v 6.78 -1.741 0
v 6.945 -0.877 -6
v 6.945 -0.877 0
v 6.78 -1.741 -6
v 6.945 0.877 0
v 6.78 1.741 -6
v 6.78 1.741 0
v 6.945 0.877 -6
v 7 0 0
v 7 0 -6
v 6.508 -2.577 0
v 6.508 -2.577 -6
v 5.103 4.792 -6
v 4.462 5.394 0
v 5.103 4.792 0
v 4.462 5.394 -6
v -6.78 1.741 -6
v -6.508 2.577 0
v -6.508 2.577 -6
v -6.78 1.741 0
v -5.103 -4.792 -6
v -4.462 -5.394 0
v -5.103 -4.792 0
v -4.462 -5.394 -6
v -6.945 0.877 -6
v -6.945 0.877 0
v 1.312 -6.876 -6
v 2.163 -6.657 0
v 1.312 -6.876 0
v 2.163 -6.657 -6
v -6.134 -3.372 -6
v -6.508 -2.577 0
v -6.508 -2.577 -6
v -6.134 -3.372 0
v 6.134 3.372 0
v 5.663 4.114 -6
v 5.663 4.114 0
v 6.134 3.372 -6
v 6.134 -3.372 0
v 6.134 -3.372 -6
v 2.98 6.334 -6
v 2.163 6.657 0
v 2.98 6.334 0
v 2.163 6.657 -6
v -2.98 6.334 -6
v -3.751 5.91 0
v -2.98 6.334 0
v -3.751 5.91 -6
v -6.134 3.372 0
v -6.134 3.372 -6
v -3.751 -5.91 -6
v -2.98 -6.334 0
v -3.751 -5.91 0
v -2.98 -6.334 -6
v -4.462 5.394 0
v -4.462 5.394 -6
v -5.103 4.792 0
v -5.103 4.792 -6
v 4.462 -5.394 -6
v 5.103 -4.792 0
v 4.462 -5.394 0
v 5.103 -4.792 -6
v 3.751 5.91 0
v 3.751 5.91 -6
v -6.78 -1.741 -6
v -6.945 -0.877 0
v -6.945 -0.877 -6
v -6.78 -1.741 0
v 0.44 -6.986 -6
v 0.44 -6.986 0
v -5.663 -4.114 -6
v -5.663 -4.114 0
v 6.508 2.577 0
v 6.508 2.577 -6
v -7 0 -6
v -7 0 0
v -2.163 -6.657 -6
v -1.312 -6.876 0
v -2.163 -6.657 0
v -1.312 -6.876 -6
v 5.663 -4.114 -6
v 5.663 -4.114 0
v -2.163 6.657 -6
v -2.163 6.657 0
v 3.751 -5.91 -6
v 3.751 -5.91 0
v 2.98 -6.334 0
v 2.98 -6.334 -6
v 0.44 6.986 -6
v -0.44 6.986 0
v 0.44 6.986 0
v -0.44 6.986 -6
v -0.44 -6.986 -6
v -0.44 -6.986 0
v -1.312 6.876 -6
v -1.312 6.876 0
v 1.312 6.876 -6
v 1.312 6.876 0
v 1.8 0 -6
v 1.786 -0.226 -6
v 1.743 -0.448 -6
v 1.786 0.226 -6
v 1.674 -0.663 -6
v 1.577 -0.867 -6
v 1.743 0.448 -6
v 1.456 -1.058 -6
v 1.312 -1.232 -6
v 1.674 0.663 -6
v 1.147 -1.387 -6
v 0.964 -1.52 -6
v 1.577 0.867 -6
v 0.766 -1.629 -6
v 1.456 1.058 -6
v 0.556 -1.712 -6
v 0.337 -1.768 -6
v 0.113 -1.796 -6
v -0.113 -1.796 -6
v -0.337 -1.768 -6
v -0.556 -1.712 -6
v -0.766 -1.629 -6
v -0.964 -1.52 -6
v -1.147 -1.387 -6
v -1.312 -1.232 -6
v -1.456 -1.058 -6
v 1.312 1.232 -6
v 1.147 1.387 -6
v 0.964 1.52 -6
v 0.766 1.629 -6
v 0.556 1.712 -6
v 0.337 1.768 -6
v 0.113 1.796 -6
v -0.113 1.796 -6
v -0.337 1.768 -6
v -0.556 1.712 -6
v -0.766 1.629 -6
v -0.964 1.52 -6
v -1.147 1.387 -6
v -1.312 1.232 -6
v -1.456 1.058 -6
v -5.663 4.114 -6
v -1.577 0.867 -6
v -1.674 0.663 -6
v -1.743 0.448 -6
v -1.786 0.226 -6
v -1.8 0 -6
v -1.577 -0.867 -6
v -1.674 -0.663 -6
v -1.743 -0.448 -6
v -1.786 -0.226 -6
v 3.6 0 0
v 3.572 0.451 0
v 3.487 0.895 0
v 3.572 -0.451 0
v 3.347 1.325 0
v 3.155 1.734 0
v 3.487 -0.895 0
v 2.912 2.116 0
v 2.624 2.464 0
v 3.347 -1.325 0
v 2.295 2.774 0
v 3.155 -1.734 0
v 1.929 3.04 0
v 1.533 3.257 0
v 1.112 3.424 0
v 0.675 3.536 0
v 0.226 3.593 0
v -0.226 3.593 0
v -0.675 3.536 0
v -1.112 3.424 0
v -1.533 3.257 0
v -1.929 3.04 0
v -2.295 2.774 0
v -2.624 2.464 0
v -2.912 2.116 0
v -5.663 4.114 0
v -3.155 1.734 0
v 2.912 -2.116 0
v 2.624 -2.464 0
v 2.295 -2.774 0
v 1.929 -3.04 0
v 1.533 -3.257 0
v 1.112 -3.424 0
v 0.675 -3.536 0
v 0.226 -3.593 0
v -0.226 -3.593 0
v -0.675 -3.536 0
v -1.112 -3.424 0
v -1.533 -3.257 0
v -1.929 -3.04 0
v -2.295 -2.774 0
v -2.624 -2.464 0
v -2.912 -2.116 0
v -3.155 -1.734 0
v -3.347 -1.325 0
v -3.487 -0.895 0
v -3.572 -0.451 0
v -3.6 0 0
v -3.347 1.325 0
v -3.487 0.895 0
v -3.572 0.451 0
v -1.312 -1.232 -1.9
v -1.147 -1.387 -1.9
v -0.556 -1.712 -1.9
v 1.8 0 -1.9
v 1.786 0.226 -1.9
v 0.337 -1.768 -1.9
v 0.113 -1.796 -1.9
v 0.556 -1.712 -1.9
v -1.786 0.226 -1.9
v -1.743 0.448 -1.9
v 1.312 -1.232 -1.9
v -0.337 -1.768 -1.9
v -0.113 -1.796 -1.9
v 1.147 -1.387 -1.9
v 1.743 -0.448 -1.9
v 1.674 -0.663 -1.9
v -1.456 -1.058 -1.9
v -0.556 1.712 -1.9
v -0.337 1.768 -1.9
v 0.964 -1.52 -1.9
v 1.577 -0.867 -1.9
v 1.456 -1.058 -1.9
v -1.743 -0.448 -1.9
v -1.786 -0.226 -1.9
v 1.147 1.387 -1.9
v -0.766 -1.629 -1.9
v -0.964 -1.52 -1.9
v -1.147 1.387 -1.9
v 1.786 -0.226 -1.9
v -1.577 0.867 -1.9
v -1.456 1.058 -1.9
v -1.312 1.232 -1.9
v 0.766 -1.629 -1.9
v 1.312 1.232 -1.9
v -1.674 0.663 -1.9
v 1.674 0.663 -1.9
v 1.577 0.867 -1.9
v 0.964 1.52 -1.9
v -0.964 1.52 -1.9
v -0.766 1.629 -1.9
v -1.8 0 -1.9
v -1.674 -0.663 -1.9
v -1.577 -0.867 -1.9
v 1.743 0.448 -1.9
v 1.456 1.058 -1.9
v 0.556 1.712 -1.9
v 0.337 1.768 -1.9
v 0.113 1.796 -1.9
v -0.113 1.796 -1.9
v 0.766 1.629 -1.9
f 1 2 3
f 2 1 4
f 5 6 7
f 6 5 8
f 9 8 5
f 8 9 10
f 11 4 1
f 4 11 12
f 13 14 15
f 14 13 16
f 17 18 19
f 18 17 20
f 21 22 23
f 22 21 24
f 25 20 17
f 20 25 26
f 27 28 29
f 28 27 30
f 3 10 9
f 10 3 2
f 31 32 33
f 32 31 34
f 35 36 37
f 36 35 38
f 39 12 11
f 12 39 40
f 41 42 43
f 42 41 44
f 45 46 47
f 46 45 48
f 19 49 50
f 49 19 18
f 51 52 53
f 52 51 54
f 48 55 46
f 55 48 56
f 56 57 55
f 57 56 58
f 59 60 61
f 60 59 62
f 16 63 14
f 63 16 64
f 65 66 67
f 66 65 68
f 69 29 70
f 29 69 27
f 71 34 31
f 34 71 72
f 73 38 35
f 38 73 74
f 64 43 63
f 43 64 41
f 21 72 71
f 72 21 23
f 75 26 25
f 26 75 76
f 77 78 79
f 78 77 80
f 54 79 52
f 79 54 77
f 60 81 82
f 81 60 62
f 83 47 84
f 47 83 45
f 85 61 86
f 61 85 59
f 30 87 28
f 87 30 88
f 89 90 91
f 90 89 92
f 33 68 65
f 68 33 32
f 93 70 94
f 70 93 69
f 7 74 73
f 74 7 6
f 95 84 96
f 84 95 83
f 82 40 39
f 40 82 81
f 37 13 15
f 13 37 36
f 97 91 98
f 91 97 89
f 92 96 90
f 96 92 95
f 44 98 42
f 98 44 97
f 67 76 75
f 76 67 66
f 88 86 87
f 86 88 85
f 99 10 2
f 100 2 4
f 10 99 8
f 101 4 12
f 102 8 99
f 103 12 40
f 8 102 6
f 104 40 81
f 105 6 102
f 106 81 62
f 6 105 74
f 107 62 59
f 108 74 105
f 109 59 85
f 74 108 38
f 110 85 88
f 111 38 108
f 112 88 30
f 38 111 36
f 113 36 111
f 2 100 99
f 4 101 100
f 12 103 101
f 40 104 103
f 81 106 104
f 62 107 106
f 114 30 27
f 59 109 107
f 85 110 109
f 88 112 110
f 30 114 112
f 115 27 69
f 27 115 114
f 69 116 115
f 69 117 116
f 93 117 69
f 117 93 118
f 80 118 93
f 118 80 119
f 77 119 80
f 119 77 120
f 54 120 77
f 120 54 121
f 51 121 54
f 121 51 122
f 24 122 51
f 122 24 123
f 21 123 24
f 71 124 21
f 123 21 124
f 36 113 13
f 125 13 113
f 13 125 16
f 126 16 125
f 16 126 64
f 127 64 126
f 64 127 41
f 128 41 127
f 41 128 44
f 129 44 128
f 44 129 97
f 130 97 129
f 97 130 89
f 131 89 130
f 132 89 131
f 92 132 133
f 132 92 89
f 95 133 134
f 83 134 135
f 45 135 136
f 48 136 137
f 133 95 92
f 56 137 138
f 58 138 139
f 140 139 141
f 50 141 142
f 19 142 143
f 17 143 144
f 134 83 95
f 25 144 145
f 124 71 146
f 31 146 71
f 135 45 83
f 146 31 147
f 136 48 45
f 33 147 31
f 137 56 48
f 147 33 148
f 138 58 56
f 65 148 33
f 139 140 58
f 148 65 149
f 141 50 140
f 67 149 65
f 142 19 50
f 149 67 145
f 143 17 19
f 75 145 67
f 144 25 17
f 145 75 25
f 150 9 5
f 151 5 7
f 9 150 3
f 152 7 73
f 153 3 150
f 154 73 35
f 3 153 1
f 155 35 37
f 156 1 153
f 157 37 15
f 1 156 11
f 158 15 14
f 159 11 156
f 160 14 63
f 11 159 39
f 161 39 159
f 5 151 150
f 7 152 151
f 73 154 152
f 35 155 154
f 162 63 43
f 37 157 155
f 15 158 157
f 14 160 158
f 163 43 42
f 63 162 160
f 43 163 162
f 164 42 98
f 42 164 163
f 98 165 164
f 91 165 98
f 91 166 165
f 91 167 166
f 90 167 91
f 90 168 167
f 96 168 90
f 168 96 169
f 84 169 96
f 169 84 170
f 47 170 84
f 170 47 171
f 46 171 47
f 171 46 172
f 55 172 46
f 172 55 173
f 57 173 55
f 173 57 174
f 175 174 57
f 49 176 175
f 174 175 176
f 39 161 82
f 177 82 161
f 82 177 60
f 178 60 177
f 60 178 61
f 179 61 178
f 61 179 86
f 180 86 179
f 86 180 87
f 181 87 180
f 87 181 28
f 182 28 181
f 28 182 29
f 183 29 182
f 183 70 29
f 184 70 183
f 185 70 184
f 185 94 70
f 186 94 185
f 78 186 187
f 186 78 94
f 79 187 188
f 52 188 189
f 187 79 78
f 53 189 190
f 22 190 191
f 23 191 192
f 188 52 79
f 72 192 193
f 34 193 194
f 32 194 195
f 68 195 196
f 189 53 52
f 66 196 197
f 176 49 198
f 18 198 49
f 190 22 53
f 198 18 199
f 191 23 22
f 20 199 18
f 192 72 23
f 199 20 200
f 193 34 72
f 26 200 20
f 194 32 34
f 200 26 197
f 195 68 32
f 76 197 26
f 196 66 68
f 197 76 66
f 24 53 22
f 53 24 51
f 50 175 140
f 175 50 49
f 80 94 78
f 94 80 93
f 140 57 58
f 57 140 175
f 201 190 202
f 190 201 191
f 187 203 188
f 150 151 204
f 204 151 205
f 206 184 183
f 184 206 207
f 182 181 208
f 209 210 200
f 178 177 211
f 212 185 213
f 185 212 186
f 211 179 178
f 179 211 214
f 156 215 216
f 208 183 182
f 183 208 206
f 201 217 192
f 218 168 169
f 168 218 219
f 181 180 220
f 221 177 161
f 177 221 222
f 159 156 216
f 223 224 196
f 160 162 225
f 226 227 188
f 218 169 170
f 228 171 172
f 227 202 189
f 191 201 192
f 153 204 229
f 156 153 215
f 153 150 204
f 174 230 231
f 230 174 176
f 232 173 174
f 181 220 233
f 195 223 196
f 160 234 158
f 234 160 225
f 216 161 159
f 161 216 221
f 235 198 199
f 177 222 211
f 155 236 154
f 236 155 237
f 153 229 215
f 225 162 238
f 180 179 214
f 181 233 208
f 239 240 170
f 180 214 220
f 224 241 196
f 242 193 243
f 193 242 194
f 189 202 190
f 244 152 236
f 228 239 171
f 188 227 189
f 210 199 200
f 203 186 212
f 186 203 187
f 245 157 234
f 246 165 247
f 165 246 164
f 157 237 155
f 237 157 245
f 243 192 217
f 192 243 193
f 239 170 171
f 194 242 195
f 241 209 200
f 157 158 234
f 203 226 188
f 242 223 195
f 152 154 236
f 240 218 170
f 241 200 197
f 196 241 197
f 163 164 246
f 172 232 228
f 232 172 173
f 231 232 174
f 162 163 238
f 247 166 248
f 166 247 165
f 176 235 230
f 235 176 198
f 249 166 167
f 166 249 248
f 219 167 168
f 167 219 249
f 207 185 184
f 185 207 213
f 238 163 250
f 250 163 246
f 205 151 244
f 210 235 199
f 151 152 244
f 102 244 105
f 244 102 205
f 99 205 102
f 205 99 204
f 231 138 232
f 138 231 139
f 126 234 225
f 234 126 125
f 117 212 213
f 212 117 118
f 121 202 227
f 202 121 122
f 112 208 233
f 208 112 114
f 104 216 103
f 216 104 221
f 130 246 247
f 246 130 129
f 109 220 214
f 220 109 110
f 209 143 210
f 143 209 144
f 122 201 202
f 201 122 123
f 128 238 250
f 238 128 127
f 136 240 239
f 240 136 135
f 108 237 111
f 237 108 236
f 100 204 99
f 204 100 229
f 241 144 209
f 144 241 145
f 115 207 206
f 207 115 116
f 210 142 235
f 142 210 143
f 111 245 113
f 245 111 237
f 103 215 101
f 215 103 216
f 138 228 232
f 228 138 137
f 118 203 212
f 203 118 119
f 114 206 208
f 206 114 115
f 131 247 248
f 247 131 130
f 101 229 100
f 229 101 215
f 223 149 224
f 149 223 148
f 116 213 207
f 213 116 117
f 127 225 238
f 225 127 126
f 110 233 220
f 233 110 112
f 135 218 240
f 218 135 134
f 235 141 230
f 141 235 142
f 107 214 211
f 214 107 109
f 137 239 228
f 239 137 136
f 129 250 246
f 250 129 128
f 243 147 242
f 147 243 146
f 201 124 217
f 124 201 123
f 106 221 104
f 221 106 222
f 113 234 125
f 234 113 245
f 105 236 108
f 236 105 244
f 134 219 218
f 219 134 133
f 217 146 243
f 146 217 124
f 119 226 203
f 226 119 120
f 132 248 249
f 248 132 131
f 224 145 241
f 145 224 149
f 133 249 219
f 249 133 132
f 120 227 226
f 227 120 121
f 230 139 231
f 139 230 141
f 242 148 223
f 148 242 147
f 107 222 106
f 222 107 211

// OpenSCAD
$fn = 50;


difference() {
	union() {
		translate(v = [0, 0, -6.0000000000]) {
			cylinder(h = 6, r = 7.0000000000);
		}
		translate(v = [0, 0, -6.0000000000]) {
			cylinder(h = 6, r = 2.8750000000);
		}
	}
	union() {
		translate(v = [0, 0, 0]) {
			rotate(a = [0, 0, 0]) {
				difference() {
					union() {
						translate(v = [0, 0, -6.0000000000]) {
							cylinder(h = 6, r = 1.5000000000);
						}
						translate(v = [0, 0, -1.9000000000]) {
							cylinder(h = 1.9000000000, r1 = 1.8000000000, r2 = 3.6000000000);
						}
						translate(v = [0, 0, -6.0000000000]) {
							cylinder(h = 6, r = 1.8000000000);
						}
						translate(v = [0, 0, -6.0000000000]) {
							cylinder(h = 6, r = 1.5000000000);
						}
					}
					union();
				}
			}
		}
	}
}
